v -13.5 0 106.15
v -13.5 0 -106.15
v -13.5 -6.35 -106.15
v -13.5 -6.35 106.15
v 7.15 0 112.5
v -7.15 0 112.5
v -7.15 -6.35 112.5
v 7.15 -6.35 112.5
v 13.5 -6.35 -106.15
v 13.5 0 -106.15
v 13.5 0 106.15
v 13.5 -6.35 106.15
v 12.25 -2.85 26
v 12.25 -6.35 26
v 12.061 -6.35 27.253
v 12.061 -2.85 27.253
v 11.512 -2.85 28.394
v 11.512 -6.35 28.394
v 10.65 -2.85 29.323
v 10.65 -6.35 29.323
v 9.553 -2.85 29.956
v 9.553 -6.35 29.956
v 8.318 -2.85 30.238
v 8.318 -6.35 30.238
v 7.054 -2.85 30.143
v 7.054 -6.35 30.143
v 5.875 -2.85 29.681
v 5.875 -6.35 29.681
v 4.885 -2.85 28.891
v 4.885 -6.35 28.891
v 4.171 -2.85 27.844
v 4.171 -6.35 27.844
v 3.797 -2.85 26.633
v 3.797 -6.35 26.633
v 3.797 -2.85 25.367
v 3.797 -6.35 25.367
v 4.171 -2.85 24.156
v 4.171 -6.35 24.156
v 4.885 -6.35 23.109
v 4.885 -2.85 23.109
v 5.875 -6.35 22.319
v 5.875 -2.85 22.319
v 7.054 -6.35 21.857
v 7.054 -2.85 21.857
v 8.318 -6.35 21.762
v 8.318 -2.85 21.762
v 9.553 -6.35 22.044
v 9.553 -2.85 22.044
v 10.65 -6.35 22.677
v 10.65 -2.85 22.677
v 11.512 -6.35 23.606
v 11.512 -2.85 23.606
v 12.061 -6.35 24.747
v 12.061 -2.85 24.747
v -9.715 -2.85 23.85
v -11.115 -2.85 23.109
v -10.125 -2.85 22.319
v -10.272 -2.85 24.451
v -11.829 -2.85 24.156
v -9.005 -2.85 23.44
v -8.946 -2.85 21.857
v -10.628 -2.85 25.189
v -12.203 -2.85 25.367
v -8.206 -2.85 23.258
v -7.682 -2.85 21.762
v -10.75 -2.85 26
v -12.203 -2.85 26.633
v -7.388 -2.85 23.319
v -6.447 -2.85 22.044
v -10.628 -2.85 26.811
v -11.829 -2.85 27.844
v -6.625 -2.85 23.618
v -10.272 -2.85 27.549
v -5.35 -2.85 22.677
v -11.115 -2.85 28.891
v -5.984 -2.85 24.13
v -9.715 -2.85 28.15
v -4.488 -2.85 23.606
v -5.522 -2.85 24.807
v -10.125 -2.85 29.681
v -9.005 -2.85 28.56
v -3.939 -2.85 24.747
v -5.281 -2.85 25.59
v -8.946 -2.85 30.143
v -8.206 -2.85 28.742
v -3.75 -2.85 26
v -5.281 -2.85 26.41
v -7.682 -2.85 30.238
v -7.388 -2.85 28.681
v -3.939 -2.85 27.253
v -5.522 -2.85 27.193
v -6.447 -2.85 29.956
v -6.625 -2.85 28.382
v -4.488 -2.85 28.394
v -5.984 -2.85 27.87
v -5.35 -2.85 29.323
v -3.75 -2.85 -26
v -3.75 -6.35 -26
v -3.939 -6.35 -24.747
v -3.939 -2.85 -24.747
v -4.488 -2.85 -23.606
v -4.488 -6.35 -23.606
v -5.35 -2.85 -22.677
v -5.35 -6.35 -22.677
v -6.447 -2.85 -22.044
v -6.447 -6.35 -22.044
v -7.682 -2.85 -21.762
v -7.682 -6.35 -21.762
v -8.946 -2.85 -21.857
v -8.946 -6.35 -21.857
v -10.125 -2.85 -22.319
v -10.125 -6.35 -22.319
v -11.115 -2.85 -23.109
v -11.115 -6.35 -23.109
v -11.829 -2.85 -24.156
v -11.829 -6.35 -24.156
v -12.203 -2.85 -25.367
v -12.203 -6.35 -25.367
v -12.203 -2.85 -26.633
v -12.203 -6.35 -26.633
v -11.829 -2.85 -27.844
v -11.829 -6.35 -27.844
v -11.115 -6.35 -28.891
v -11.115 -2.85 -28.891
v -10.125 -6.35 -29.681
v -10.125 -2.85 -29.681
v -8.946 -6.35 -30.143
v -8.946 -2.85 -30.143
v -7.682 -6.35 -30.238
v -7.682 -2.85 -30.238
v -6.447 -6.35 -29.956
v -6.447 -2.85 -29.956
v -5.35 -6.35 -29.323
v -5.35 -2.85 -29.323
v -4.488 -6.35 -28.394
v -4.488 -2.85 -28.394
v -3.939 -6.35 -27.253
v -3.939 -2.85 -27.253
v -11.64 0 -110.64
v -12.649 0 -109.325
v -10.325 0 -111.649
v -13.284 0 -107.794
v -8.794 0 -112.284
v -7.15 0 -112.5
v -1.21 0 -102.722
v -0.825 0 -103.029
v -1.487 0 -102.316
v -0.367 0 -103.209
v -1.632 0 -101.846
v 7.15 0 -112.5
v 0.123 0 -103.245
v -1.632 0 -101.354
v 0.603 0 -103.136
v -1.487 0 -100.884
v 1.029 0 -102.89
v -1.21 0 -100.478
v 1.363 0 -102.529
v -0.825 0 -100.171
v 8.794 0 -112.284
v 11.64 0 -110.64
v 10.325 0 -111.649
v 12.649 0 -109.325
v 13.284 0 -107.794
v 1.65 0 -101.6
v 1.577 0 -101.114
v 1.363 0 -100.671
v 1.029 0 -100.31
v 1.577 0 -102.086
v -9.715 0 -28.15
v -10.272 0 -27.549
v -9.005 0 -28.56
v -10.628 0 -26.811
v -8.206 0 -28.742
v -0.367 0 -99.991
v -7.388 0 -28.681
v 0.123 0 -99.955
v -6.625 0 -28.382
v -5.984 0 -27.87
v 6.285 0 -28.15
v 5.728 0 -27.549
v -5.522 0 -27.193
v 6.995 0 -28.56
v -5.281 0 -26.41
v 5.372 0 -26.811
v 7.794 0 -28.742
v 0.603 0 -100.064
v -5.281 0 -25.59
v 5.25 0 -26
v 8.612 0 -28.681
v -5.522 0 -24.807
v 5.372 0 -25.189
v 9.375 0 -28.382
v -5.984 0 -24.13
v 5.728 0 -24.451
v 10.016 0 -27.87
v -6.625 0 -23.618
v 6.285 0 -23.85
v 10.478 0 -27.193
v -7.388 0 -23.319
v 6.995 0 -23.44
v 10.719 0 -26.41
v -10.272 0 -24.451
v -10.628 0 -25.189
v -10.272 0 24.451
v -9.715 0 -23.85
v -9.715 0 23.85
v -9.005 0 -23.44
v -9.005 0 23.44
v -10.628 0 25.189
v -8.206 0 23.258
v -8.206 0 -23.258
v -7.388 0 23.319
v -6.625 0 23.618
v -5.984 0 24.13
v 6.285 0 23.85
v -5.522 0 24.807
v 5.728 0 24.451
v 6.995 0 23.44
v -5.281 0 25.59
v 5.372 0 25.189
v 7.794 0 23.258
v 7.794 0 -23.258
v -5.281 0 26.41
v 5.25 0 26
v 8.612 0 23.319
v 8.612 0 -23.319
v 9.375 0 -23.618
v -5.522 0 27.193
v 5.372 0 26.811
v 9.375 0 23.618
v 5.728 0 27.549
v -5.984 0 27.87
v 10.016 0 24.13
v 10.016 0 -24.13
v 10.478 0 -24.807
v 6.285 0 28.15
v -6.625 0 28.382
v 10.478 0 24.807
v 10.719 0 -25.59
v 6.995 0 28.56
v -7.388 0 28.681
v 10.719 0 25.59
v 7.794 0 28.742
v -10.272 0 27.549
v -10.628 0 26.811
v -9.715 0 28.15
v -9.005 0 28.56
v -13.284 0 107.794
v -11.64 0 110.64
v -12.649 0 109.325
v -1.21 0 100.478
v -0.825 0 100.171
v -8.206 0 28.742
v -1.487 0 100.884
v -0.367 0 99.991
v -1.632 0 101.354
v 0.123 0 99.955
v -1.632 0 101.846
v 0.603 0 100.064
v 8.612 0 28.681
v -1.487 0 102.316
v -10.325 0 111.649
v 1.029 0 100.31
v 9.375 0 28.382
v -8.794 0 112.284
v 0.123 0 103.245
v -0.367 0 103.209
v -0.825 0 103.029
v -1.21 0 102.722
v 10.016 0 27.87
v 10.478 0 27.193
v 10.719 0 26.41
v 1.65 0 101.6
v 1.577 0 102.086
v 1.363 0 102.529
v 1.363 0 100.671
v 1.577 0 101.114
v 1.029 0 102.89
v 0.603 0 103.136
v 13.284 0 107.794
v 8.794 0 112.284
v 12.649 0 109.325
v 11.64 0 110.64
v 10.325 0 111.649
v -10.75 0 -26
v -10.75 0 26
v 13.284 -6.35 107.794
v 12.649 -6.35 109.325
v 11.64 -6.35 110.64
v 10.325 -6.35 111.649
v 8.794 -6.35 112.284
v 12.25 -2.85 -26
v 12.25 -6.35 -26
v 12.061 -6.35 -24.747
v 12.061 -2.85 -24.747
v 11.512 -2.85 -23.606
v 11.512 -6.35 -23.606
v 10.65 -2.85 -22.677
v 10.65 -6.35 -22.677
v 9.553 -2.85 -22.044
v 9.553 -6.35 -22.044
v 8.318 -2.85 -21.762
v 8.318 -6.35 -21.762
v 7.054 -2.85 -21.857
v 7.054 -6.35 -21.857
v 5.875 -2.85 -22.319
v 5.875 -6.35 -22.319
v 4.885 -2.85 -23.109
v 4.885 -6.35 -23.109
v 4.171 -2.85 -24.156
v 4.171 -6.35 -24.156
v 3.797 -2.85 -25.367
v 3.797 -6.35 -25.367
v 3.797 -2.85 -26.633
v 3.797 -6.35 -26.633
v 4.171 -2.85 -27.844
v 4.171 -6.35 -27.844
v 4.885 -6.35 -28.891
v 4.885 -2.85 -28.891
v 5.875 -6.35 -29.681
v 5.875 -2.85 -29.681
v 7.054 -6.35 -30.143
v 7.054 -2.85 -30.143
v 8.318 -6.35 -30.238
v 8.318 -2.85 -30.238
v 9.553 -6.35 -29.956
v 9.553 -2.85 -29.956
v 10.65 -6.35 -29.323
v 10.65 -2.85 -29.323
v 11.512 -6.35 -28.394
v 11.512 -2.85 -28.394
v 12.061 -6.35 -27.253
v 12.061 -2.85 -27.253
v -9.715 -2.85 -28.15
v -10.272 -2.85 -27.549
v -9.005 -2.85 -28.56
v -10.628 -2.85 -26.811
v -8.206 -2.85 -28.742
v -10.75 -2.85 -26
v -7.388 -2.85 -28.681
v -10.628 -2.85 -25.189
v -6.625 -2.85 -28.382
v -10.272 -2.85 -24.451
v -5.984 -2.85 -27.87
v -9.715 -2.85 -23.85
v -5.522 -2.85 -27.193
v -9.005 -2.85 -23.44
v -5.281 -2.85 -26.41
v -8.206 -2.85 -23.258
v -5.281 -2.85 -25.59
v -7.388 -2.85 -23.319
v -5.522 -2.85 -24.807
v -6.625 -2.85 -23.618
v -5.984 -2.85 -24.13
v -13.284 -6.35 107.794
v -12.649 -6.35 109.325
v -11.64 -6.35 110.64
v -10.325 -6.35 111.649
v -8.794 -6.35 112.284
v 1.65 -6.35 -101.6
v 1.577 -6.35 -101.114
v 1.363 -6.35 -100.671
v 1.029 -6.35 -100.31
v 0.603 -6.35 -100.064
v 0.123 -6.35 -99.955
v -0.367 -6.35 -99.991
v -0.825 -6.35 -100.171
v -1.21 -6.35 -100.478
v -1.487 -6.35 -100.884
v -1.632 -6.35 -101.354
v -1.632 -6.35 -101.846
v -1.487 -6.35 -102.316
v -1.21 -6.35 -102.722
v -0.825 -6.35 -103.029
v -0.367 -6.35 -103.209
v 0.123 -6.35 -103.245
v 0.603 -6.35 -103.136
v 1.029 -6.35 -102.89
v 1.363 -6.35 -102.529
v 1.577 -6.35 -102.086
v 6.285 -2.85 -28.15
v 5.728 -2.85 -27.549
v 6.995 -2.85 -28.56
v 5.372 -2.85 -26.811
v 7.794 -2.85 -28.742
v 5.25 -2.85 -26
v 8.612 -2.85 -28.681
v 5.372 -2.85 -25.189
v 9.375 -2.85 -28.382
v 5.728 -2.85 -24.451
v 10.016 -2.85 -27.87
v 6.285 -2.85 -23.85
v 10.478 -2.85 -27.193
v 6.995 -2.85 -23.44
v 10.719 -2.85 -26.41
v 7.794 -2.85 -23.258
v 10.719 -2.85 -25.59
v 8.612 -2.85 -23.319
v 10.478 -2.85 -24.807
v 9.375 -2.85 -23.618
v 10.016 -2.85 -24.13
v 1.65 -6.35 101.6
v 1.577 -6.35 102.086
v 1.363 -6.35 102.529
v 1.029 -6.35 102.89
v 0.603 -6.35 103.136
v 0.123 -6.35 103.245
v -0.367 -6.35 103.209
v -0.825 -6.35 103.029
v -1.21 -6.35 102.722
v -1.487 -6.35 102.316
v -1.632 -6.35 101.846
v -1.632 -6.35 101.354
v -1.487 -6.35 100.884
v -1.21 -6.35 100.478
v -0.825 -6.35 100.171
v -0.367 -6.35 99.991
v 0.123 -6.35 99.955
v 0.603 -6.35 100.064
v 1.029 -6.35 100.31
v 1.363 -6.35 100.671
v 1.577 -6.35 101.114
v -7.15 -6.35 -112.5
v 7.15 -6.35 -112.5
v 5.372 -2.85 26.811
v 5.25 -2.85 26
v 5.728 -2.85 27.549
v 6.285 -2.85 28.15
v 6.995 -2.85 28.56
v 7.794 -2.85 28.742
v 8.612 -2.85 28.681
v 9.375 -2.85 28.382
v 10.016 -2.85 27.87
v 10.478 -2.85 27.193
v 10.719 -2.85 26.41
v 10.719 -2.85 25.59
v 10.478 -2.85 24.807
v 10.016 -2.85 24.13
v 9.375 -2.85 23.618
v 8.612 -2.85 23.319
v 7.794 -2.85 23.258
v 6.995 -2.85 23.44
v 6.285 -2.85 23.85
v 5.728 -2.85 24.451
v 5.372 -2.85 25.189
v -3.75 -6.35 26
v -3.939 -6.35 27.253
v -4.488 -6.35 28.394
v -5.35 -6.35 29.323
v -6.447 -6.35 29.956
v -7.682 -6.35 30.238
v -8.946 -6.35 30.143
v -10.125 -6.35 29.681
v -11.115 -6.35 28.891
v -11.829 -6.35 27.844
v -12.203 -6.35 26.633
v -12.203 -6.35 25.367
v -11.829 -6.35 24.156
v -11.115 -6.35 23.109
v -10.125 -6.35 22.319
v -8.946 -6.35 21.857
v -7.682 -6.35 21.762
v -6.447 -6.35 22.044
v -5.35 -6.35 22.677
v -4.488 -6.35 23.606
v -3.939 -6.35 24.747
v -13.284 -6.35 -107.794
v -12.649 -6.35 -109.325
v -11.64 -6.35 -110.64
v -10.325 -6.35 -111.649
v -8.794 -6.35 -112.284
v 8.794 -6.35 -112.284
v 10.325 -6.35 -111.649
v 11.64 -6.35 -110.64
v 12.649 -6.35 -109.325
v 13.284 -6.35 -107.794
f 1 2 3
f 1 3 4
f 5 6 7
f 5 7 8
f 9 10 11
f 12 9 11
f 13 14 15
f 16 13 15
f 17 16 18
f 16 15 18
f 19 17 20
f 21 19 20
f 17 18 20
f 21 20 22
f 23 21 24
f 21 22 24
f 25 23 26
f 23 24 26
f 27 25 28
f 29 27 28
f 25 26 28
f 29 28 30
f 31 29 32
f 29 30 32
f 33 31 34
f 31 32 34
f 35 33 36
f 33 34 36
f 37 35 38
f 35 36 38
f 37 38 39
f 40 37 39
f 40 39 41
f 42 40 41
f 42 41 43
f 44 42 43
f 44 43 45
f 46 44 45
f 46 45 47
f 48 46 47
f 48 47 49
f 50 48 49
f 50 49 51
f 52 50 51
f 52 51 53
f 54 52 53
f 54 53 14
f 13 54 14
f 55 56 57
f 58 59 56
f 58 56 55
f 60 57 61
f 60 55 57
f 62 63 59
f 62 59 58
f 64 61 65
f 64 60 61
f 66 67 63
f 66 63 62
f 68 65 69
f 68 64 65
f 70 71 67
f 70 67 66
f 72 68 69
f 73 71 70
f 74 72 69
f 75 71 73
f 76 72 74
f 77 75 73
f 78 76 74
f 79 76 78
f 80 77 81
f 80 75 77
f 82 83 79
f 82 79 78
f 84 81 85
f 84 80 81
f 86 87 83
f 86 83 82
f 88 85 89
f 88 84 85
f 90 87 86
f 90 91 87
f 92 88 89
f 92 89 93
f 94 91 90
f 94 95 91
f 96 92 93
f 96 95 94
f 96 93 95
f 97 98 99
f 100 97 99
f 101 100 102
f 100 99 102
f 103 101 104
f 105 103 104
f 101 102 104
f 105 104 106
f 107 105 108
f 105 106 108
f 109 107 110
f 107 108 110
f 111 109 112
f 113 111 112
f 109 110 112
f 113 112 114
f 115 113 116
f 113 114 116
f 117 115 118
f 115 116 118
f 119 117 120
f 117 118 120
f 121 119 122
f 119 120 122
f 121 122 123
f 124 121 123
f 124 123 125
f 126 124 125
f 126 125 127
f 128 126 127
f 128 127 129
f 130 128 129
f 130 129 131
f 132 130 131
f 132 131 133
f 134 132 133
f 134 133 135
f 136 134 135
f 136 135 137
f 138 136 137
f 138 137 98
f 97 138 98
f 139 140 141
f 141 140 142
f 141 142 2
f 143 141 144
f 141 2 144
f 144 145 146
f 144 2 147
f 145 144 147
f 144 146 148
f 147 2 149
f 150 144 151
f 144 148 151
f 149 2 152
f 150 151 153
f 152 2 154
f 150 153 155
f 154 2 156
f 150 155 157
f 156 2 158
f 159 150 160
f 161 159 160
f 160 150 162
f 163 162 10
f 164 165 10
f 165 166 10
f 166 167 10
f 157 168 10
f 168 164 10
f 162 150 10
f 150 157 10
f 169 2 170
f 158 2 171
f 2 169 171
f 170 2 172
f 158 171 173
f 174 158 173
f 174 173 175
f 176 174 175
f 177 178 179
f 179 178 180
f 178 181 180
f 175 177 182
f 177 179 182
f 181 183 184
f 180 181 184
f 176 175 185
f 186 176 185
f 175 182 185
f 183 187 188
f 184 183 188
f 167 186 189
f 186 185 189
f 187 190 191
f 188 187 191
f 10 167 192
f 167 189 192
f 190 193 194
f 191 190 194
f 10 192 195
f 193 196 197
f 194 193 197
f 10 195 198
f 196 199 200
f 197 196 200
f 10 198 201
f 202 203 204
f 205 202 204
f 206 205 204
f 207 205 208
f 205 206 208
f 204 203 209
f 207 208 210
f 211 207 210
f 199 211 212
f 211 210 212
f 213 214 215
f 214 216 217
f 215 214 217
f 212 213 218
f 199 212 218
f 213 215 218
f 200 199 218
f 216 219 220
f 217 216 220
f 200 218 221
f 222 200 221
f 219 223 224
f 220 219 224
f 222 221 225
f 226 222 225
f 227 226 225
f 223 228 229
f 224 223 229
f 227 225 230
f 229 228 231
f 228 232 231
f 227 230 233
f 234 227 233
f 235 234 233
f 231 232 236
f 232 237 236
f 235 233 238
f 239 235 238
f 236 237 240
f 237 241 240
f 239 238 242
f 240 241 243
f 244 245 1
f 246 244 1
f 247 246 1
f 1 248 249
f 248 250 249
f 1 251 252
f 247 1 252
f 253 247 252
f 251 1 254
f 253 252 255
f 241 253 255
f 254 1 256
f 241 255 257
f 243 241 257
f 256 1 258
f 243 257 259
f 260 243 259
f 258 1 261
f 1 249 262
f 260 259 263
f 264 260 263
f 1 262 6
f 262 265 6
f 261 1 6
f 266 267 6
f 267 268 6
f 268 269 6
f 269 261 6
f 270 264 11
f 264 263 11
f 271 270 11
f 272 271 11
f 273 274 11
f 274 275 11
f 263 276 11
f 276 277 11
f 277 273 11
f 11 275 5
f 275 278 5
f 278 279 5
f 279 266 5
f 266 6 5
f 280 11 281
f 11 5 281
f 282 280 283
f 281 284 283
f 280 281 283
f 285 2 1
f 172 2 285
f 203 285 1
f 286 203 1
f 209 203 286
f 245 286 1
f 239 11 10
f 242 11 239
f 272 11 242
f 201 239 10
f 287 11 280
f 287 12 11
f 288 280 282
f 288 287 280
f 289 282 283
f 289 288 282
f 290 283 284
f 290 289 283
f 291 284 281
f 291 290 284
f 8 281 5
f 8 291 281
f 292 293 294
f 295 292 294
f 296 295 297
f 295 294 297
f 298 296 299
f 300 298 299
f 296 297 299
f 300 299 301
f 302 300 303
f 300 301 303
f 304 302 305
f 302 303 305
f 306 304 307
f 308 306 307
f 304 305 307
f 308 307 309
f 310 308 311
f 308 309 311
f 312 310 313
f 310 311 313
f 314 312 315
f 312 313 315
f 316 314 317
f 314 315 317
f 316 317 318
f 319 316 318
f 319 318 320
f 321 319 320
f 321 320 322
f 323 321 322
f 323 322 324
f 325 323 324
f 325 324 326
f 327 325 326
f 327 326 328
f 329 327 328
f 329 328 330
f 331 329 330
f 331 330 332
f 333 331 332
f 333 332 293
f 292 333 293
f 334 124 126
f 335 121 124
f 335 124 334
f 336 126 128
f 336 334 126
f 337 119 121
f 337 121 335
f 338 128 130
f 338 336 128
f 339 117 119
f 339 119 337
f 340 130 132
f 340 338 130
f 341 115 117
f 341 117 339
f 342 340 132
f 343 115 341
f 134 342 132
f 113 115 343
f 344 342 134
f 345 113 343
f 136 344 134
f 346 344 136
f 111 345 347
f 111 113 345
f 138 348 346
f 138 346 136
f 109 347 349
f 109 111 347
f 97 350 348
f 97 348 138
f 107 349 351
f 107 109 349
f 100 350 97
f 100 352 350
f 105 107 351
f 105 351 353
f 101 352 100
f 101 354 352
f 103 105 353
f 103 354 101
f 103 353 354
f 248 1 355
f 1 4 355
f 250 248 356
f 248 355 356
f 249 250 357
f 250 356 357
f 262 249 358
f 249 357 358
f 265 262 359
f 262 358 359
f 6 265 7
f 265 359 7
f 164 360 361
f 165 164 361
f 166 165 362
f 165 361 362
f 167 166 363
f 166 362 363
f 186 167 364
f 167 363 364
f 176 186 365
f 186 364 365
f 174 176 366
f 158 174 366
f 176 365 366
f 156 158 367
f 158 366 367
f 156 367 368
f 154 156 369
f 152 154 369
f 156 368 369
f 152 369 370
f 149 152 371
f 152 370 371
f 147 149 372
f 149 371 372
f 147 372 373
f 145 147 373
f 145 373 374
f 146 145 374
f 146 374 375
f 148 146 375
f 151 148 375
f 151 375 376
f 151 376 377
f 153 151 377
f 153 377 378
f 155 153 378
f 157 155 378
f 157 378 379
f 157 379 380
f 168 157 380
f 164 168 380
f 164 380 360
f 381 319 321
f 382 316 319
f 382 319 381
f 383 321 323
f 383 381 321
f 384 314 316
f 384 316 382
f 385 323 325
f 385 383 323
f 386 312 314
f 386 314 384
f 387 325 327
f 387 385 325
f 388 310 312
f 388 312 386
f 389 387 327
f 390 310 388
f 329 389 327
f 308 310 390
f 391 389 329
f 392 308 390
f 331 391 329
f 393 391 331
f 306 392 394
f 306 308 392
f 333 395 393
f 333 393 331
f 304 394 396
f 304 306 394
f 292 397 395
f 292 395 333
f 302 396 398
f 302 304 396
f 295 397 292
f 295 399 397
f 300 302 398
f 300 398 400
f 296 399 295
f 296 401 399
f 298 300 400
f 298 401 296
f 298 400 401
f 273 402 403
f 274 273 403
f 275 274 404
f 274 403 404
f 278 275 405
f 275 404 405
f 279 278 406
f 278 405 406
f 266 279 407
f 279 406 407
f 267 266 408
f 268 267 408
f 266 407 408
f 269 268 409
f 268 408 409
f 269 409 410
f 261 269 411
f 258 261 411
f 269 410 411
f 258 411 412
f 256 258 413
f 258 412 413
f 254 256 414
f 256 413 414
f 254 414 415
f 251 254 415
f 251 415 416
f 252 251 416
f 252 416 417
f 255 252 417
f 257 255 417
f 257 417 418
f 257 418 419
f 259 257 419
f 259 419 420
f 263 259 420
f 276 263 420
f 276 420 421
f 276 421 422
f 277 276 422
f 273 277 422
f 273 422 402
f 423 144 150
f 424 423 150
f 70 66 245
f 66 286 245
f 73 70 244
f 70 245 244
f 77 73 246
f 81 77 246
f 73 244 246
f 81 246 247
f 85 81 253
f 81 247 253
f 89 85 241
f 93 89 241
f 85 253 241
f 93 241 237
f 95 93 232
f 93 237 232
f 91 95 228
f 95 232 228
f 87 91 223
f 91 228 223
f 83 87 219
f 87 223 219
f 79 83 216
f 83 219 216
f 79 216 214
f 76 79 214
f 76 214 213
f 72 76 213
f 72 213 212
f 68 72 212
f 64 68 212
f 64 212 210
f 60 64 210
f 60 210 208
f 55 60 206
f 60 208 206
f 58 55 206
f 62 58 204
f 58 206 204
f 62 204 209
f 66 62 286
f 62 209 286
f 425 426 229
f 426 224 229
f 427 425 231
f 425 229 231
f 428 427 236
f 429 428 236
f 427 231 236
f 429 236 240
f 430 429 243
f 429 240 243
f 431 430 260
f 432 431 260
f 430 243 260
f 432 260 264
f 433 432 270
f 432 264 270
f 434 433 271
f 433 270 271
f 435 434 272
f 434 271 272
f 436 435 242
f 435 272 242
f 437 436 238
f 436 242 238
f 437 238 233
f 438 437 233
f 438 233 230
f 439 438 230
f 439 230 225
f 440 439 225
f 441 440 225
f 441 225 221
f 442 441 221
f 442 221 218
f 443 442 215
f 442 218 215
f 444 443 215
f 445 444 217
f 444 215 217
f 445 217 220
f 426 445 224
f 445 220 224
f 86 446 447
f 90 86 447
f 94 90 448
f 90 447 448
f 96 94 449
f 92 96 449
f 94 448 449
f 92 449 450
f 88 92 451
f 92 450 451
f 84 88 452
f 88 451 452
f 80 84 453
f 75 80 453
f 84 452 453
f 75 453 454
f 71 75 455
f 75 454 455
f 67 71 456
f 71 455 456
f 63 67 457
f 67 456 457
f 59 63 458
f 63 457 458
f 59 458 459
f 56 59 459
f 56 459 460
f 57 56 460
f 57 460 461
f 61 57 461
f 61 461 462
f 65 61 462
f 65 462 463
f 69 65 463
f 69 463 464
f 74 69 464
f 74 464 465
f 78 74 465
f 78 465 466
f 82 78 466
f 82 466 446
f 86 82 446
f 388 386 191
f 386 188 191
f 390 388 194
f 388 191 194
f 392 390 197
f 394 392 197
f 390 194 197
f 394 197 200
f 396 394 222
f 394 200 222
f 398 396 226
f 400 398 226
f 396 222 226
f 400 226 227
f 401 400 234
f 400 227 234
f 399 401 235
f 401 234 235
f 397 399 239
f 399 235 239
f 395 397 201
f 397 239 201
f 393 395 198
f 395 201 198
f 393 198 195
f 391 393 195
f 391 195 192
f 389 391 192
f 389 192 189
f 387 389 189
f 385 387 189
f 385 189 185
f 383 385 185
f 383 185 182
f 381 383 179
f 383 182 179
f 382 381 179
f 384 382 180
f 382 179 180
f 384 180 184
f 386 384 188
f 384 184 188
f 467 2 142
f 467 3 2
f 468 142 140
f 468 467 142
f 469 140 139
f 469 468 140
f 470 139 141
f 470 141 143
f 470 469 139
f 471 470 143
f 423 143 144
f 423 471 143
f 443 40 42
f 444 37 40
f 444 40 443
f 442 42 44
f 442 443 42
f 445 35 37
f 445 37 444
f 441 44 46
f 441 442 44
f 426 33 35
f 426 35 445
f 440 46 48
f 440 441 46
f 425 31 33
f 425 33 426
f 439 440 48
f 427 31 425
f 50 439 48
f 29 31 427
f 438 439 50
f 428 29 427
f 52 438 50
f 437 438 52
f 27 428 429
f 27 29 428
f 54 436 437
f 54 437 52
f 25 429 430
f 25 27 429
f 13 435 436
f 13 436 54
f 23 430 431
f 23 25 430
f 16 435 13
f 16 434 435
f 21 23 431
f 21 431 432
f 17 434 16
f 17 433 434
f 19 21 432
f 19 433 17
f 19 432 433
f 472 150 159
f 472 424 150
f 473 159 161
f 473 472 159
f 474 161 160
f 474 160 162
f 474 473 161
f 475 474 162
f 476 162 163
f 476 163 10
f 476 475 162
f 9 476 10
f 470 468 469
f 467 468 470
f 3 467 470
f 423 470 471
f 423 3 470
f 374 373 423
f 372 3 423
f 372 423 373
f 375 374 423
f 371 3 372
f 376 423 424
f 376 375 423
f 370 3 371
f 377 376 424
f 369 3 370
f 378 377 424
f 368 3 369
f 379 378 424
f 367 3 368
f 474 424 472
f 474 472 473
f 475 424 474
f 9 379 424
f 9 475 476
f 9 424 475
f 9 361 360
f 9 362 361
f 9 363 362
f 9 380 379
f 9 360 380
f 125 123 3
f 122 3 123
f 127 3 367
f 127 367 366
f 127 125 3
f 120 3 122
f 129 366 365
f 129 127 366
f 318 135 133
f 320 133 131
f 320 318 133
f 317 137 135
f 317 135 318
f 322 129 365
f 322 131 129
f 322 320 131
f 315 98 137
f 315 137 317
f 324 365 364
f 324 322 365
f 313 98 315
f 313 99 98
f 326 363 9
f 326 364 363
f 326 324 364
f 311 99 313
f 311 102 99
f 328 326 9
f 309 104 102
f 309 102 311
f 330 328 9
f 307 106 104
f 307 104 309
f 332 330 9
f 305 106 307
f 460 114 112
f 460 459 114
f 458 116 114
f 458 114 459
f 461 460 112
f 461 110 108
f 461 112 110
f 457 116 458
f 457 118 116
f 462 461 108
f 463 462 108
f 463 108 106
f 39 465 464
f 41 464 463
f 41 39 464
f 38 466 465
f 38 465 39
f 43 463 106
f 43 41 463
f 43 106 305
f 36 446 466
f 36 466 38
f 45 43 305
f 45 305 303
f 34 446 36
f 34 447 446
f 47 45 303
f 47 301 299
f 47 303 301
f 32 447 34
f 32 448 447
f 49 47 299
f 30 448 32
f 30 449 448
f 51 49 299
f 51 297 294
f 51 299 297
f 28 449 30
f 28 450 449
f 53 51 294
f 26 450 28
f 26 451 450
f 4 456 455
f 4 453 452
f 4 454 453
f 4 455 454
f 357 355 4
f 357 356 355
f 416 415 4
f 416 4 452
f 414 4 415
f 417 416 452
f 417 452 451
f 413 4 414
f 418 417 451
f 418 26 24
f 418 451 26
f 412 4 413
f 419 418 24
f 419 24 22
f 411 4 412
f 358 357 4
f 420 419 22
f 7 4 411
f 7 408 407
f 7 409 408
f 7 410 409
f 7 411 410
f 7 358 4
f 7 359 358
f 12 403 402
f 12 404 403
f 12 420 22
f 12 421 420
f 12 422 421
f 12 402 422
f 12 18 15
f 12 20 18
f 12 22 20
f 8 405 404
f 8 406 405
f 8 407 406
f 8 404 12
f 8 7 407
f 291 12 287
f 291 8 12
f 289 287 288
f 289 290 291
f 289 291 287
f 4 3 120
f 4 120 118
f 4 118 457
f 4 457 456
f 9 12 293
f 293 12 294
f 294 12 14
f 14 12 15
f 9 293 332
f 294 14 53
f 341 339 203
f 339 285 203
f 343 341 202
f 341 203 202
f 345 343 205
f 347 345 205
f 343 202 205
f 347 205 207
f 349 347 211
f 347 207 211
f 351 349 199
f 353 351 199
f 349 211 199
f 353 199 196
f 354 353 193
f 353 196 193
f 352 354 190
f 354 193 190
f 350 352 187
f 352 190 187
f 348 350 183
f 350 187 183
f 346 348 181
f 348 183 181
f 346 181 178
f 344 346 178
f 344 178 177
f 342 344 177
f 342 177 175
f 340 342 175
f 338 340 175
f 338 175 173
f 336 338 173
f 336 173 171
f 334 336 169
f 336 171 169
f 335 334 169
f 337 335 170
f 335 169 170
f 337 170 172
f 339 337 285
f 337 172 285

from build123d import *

# Parameters (mm, degrees)
F0_W           = 27
F0_H           = 225
F1_DEPTH       = 6.35
F2_R           = 6.35
F4_D           = 5.5
F4_CBORE_D     = 8.5
F4_CBORE_DEPTH = 3.5
F6_D           = 3.3


with BuildPart() as f1:
    # F0 (on Front) → F1 (new body)
    with BuildSketch(Plane.XZ):
        Rectangle(F0_W, F0_H)
    extrude(amount=F1_DEPTH)

    # F2
    f2_edges = [f1.edges().sort_by_distance(p)[0] for p in [
        (13.5, -3.175, 112.5),
        (-13.5, -3.175, 112.5),
        (13.5, -3.175, -112.5),
        (-13.5, -3.175, -112.5),
    ]]
    fillet(f2_edges, radius=F2_R)

    # F4 (through all)
    with Locations(Plane.XZ.offset(6.35)):
        with Locations((-8, 26), (8, 26), (-8, -26), (8, -26)):
            CounterBoreHole(F4_D / 2, F4_CBORE_D / 2, F4_CBORE_DEPTH)

    # F6 (through all)
    with Locations(Plane(origin=(0, 0, 0), x_dir=(-1, 0, 0), z_dir=(0, 1, 0))):
        with Locations((0, 101.6), (0, -101.6)):
            Hole(F6_D / 2)


solid = f1.part
